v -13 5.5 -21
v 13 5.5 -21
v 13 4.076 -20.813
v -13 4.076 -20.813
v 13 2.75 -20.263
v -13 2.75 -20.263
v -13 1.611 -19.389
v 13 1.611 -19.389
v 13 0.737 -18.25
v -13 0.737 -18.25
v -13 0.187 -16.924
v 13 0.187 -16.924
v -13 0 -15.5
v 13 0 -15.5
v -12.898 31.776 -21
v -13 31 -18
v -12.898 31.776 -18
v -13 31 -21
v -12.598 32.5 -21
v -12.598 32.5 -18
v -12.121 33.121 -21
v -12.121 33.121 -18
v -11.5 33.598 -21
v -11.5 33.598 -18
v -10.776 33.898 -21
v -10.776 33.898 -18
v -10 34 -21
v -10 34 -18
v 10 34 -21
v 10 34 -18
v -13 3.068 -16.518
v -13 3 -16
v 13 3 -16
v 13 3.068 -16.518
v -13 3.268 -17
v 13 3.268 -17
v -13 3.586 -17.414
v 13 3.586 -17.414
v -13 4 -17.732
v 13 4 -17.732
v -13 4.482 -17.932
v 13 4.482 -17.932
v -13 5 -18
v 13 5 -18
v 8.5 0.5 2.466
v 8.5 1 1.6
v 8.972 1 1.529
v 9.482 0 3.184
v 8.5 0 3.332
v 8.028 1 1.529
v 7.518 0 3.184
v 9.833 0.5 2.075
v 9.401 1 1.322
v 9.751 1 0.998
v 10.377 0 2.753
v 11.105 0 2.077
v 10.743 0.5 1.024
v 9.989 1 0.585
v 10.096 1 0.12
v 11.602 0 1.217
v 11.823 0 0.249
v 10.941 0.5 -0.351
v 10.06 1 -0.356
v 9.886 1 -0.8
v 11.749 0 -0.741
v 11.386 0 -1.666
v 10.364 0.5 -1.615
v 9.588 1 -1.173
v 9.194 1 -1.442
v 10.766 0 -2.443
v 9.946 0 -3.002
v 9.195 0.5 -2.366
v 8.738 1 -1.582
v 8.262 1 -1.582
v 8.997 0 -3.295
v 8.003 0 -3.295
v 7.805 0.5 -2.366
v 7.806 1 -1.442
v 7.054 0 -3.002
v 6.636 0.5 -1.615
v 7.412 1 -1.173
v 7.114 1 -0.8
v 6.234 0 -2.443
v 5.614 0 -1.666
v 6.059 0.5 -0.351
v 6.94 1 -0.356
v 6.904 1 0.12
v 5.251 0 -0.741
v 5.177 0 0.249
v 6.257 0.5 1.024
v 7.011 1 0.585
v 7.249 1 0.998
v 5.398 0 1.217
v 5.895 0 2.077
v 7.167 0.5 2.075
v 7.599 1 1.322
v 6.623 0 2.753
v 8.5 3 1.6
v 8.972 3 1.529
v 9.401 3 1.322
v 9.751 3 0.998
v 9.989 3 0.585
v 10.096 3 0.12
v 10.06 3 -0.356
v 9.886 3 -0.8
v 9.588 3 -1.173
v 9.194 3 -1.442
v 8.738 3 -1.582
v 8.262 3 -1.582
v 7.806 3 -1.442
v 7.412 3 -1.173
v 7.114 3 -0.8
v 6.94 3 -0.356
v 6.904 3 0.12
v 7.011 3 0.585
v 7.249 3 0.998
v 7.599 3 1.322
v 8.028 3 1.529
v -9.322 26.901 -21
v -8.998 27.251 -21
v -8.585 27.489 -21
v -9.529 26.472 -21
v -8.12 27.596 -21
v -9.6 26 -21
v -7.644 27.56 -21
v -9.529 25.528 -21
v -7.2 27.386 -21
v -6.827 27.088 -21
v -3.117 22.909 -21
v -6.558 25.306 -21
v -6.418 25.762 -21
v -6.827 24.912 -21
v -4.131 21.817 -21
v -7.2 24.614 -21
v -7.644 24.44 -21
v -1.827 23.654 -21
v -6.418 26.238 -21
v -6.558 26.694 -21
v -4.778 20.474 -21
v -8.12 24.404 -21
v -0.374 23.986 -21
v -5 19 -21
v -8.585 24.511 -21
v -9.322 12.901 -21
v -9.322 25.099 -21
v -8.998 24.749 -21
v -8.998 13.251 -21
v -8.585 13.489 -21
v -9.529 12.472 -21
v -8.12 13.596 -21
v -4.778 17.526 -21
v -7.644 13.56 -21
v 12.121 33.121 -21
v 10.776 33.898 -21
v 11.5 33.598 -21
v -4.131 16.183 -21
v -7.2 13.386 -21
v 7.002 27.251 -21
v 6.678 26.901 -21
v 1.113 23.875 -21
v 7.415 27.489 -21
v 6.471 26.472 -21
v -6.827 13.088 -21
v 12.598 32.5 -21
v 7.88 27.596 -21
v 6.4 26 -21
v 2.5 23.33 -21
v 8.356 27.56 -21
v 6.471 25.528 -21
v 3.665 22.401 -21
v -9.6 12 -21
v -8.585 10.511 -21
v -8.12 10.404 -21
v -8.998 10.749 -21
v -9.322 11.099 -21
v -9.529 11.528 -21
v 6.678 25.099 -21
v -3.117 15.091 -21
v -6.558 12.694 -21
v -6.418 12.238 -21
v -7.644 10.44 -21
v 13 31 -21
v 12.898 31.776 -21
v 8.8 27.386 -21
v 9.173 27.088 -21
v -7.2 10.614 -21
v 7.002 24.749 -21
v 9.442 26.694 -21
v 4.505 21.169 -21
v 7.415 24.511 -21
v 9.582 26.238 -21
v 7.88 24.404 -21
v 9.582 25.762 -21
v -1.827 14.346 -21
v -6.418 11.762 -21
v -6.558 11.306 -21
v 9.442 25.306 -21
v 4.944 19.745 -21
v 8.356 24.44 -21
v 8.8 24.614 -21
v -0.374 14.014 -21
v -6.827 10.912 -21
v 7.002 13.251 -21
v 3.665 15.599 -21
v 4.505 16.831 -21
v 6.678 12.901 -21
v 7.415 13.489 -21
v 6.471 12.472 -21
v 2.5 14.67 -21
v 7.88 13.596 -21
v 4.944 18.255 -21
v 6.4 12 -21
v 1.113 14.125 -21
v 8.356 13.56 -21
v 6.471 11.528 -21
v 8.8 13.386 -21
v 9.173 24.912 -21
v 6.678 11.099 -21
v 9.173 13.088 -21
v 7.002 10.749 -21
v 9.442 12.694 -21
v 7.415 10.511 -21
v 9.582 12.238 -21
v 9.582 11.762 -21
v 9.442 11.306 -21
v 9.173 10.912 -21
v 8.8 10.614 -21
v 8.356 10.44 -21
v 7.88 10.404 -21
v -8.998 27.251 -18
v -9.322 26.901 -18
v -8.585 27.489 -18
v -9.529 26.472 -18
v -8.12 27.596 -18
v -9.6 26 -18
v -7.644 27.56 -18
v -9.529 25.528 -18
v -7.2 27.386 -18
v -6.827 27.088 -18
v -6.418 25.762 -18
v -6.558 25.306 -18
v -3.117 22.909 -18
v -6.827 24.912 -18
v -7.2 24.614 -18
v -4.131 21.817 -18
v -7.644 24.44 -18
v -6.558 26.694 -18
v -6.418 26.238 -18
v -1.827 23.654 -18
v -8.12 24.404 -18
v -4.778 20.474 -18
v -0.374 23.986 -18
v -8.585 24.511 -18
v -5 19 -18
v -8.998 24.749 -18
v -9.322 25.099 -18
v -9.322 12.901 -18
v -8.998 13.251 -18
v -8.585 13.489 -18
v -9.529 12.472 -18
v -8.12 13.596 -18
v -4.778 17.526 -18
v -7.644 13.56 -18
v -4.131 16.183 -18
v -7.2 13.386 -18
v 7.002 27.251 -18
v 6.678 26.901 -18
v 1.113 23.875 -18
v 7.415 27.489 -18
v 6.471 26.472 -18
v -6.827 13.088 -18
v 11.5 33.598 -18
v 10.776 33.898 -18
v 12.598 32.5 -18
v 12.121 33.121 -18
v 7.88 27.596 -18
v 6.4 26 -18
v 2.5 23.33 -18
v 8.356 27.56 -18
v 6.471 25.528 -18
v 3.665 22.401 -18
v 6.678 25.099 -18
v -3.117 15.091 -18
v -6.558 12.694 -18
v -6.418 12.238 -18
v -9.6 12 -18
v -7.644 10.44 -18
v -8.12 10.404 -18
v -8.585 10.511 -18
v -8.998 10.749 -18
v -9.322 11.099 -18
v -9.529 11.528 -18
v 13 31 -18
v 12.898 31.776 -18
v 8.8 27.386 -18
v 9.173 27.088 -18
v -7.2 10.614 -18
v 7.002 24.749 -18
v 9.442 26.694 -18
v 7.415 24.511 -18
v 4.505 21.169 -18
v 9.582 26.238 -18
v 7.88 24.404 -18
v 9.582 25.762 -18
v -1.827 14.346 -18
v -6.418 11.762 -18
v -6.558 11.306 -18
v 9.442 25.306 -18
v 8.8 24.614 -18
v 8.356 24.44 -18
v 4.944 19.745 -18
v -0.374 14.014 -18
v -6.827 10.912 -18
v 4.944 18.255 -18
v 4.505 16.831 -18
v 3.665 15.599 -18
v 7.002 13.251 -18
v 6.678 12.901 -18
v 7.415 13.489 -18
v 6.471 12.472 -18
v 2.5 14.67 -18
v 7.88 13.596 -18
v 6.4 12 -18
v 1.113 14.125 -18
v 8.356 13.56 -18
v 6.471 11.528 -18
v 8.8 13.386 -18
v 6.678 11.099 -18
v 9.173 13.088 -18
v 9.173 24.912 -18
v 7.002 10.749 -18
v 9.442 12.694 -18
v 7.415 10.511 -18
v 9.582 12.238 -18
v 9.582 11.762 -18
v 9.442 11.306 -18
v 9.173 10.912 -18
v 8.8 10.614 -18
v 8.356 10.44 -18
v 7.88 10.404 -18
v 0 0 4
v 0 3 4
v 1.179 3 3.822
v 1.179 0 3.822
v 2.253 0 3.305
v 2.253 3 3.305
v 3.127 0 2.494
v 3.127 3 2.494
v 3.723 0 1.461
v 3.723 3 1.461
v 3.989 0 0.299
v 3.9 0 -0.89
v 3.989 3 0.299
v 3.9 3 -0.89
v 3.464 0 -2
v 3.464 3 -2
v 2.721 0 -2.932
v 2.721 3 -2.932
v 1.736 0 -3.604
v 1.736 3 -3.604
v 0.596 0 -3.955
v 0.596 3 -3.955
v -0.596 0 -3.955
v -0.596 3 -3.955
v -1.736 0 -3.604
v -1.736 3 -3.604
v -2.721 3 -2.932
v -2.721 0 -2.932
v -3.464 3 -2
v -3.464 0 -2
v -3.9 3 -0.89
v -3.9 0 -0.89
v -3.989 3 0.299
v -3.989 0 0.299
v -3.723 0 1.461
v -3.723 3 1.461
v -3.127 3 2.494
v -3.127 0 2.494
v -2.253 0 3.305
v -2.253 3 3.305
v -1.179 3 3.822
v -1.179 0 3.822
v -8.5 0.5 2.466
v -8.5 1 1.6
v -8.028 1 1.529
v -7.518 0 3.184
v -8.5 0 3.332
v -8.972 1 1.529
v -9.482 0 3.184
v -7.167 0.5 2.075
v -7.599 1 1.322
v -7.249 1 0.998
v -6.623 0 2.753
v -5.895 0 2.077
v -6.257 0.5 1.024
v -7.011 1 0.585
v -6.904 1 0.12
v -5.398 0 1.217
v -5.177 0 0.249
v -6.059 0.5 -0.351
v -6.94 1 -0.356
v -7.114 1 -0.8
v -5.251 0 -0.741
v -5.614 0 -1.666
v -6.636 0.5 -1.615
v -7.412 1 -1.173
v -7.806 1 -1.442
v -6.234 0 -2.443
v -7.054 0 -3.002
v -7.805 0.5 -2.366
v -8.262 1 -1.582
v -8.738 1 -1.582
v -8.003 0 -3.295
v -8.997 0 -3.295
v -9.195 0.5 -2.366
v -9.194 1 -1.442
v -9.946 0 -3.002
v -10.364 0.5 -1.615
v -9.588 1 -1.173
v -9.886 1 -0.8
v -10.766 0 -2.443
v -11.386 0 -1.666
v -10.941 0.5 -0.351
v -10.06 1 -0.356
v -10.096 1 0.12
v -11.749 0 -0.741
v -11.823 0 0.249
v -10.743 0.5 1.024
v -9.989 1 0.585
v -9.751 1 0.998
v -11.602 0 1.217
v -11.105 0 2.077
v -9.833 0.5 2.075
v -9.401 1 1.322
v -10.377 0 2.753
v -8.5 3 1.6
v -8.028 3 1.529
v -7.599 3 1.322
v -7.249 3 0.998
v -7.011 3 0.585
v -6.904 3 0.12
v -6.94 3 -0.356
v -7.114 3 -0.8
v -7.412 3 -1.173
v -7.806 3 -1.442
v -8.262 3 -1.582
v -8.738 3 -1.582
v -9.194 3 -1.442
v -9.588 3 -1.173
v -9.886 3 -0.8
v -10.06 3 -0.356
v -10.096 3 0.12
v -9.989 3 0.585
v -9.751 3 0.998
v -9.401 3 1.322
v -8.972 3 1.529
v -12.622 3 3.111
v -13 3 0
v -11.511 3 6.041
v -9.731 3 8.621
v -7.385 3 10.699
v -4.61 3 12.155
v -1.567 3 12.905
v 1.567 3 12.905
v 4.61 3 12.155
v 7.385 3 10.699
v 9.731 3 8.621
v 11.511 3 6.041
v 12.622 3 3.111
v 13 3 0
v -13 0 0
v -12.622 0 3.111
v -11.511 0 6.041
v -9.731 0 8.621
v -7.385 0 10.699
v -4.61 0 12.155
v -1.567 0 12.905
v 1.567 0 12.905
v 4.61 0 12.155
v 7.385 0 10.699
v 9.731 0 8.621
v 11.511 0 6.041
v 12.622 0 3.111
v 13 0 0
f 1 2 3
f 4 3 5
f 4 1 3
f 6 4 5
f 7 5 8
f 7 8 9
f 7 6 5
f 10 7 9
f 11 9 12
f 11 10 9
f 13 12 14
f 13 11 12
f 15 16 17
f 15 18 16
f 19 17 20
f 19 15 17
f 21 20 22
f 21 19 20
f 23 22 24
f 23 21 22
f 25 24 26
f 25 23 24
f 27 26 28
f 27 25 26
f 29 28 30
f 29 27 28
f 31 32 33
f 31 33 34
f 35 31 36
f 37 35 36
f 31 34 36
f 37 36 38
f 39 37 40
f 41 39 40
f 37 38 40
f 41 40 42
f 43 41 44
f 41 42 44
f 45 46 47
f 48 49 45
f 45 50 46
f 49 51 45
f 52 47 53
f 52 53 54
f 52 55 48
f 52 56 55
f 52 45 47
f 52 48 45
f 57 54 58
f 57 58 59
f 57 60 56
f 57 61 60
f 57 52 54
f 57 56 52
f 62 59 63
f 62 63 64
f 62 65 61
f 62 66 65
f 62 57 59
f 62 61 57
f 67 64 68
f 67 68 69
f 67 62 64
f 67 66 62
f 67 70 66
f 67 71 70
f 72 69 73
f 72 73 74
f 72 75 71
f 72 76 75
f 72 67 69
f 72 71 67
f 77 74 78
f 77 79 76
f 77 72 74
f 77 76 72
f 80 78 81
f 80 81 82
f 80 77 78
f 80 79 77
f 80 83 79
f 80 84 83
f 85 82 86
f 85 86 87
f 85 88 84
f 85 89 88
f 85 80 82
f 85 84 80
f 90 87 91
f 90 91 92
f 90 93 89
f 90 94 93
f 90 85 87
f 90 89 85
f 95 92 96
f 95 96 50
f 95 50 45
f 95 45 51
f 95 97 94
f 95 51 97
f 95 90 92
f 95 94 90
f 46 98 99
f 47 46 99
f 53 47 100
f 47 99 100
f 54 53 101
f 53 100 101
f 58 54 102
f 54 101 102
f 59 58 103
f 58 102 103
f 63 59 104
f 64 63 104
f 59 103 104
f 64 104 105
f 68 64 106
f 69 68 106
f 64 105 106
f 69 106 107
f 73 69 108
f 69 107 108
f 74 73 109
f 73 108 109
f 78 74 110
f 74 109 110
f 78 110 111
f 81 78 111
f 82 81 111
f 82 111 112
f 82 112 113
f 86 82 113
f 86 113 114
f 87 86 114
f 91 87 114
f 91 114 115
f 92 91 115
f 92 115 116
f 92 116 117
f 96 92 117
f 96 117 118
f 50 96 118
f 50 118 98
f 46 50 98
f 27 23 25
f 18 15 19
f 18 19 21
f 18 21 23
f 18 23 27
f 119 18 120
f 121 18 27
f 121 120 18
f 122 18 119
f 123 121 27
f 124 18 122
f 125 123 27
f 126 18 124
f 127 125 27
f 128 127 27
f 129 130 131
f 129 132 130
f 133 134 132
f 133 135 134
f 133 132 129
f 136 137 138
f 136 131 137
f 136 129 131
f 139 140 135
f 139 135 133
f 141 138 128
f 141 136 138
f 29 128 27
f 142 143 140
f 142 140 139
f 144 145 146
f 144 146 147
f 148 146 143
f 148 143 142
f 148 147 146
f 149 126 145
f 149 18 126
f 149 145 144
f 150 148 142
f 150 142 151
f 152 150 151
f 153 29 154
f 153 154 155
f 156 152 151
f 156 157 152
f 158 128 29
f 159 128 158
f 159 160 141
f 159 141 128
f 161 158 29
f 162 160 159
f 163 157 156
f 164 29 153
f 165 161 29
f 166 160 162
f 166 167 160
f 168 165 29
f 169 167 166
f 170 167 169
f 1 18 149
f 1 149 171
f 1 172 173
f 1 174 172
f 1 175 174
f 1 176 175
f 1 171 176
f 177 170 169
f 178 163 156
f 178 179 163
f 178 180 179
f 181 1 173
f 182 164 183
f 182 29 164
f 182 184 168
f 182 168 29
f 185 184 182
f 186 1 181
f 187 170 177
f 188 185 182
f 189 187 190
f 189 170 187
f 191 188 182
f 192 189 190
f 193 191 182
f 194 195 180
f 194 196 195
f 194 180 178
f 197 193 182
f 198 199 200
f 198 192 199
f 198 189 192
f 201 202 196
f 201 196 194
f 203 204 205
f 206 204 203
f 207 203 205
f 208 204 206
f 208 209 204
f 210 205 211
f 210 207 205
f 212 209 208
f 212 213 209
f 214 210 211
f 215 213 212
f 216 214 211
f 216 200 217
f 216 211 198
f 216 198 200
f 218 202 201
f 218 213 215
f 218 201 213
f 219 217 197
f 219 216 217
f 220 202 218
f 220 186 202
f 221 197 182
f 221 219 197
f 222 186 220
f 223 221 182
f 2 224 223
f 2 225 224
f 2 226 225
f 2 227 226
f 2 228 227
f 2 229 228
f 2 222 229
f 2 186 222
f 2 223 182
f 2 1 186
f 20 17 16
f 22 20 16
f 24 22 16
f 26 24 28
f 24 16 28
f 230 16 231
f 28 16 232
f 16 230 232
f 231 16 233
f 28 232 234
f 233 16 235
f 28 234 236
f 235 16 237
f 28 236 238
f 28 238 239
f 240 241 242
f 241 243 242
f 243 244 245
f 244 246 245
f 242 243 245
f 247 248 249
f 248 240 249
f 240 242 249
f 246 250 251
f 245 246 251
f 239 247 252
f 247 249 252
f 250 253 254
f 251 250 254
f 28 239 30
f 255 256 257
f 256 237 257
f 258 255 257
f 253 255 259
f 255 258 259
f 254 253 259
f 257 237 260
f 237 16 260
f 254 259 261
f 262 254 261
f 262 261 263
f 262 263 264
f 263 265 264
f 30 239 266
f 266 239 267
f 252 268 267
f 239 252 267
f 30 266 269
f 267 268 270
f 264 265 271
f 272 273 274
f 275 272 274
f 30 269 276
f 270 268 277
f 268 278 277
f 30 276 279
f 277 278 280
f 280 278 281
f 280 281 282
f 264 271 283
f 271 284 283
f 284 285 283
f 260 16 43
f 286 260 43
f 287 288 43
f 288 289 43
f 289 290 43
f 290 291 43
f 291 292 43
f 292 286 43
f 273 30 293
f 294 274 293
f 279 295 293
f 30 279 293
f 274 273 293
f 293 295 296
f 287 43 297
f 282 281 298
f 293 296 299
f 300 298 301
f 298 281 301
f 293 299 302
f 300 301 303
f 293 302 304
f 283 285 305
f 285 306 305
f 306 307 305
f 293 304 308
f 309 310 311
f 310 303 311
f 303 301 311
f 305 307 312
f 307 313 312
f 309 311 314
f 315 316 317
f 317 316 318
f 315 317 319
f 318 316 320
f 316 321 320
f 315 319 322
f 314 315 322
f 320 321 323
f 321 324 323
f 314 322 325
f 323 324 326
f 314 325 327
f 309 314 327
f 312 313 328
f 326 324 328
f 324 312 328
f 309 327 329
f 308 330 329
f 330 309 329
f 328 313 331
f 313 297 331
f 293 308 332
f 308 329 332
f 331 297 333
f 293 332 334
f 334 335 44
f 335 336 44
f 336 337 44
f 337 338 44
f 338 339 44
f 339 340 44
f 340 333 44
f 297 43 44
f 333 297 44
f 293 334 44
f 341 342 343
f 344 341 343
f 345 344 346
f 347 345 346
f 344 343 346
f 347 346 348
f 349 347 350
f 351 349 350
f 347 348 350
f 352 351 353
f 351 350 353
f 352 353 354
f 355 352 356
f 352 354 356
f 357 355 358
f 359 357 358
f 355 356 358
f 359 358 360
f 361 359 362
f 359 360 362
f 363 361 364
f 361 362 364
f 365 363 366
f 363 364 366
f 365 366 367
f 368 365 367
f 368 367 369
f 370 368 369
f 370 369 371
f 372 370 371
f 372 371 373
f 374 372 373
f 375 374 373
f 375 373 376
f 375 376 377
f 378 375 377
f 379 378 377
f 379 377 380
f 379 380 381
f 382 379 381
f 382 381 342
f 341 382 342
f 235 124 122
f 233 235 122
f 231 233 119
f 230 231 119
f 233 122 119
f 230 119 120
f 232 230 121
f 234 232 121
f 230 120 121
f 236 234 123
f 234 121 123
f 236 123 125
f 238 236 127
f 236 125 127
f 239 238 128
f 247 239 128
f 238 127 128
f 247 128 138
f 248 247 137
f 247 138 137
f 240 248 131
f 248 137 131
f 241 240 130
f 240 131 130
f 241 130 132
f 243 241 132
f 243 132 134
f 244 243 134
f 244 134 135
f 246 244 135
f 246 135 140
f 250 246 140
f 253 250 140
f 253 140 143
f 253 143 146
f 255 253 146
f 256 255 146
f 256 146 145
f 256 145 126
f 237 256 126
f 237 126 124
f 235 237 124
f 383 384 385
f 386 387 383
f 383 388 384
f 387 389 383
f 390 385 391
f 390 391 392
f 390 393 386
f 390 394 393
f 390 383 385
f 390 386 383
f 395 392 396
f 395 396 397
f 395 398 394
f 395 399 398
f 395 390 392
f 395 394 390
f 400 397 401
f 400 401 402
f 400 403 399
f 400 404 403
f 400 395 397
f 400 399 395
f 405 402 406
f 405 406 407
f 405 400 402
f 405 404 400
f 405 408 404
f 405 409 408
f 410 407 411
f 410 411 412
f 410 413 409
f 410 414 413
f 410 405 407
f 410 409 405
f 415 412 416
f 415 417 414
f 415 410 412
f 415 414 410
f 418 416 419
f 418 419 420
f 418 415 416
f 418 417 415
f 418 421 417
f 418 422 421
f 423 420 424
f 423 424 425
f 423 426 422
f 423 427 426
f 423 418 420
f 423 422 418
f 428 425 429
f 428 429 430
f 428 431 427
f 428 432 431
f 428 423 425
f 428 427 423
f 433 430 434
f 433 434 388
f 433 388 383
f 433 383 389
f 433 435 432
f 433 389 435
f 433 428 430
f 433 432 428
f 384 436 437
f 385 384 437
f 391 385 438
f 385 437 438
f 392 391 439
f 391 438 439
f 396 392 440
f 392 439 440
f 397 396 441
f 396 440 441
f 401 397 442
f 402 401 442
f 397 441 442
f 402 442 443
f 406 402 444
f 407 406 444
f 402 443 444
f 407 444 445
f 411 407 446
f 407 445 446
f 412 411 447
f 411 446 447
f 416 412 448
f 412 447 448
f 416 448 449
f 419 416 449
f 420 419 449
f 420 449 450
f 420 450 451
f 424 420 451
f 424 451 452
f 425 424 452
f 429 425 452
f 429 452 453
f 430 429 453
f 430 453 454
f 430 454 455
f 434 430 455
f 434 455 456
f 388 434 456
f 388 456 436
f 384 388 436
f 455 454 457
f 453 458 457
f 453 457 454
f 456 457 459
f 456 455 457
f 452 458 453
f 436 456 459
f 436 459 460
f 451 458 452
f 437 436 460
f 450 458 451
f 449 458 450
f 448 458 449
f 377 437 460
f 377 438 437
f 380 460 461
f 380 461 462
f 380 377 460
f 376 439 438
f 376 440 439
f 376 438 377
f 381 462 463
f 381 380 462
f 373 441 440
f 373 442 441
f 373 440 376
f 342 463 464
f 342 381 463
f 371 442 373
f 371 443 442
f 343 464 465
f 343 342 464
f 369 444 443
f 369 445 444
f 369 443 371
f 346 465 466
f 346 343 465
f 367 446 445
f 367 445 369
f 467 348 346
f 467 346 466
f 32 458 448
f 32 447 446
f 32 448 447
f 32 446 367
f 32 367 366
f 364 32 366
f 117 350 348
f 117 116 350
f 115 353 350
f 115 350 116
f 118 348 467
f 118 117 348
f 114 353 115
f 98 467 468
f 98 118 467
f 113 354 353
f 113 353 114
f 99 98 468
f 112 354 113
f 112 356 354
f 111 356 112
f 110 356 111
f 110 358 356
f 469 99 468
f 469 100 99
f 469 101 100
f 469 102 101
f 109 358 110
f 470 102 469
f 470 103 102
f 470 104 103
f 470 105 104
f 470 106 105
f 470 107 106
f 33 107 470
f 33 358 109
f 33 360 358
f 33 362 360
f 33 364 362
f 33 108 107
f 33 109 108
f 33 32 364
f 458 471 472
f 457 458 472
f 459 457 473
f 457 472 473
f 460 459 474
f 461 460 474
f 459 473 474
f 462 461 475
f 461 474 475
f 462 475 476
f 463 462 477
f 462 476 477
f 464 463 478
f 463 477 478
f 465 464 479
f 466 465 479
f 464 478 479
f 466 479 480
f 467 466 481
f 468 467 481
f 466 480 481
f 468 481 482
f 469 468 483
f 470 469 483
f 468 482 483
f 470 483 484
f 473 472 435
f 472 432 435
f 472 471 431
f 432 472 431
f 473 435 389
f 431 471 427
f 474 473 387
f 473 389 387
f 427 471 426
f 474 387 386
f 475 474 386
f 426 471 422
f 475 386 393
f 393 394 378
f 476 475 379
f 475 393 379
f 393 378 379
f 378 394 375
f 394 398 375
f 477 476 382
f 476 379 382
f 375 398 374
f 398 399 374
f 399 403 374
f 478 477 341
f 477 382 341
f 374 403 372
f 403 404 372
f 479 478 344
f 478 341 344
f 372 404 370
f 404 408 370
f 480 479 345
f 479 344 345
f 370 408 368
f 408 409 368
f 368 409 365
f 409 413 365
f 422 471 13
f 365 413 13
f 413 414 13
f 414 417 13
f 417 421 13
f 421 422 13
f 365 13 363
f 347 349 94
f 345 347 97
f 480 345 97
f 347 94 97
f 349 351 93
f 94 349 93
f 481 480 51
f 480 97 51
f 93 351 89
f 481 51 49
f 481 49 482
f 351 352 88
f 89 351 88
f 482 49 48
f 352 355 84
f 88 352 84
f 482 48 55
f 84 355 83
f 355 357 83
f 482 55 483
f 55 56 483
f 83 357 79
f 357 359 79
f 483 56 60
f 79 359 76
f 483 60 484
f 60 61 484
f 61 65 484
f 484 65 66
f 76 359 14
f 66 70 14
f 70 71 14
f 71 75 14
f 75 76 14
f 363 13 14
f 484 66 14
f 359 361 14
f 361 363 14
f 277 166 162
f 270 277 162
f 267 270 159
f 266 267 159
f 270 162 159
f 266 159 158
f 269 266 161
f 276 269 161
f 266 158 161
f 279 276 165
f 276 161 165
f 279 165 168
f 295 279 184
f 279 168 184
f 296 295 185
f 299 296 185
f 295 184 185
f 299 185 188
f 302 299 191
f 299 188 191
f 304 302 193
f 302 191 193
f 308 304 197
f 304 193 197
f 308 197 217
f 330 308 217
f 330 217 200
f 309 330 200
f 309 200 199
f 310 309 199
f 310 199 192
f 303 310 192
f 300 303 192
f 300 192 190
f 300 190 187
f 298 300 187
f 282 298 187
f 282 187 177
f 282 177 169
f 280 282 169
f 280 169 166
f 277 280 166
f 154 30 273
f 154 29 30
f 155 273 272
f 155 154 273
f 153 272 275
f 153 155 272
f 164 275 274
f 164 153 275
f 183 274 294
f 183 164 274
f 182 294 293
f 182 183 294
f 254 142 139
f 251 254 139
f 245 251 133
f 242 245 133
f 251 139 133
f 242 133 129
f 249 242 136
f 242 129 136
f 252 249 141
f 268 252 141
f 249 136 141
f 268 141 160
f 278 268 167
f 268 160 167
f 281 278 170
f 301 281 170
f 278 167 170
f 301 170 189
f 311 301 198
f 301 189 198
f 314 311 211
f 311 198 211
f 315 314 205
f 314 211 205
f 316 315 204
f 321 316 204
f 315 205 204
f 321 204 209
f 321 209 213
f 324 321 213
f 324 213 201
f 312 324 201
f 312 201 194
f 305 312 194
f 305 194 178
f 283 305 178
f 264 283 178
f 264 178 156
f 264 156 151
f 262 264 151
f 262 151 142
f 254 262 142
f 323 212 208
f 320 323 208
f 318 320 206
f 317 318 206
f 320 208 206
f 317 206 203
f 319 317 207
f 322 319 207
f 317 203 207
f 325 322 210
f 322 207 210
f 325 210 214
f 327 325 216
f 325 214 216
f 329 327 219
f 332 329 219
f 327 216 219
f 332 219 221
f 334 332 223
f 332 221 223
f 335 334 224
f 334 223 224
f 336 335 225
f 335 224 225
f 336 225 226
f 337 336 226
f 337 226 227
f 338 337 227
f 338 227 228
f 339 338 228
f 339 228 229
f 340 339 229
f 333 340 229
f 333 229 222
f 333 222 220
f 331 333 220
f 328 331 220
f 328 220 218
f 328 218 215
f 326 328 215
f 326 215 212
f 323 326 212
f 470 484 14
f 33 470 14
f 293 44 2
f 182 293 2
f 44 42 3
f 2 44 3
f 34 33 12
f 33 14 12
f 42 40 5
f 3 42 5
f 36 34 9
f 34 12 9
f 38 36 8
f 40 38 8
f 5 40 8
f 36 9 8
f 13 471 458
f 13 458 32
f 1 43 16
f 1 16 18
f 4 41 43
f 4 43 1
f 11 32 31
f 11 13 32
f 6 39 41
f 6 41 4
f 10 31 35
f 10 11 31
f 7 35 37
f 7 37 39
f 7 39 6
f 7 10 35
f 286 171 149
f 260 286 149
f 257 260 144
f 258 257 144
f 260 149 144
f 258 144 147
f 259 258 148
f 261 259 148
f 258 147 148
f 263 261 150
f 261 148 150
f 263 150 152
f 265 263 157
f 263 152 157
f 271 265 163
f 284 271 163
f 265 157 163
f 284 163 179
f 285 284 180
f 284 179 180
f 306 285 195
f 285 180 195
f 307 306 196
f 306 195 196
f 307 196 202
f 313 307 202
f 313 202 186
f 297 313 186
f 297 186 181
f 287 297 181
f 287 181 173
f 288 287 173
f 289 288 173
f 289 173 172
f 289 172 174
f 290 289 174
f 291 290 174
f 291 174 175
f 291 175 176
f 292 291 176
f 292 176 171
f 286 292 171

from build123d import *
from OCP.BRepFilletAPI import BRepFilletAPI_MakeChamfer

# Parameters (mm, degrees)
EXTRUDE_1_DEPTH     = 3
SKETCH_2_R          = 4
SKETCH_2_R_2        = 1.6
CUT_EXTRUDE_1_DEPTH = 5
SKETCH_3_W          = 26
SKETCH_3_H          = 3
EXTRUDE_2_DEPTH     = 31
FILLET_1_R          = 2
FILLET_2_R          = 5.5
SKETCH_4_R          = 5
SKETCH_4_R_2        = 1.6
CUT_EXTRUDE_2_DEPTH = 31
FILLET_3_R          = 3
CHAMFER_1_SIZE      = 1
CHAMFER_1_SIZE2     = 1.732050808


with BuildPart() as part:
    # ｽｹｯﾁ1 → ﾎﾞｽ - 押し出し1 (new body)
    with BuildSketch(Plane(origin=(0, 0, 0), x_dir=(1, 0, 0), z_dir=(0, 1, 0))):
        with BuildLine():
            Line((-13, 21), (-13, 0))
            ThreePointArc((-13, 0), (0, -13), (13, 0))
            Line((13, 0), (13, 21))
            Line((13, 21), (-13, 21))
        make_face()
    extrude(amount=EXTRUDE_1_DEPTH)

    # ｽｹｯﾁ2 → ｶｯﾄ - 押し出し1 (cut)
    with BuildSketch(Plane(origin=(0, 3, 0), x_dir=(1, 0, 0), z_dir=(0, 1, 0))):
        Circle(SKETCH_2_R)
        with Locations((-8.5, 0)):
            Circle(SKETCH_2_R_2)
        with Locations((8.5, 0)):
            Circle(SKETCH_2_R_2)
    extrude(amount=-CUT_EXTRUDE_1_DEPTH, mode=Mode.SUBTRACT)

    # ｽｹｯﾁ3 → ﾎﾞｽ - 押し出し2 (add)
    with BuildSketch(Plane(origin=(0, 3, 0), x_dir=(1, 0, 0), z_dir=(0, 1, 0))):
        with Locations((0, 19.5)):
            Rectangle(SKETCH_3_W, SKETCH_3_H)
    extrude(amount=EXTRUDE_2_DEPTH)

    # ﾌｨﾚｯﾄ1
    fillet_1_edges = [part.edges().sort_by_distance(p)[0] for p in [
        (0, 3, -18),
    ]]
    fillet(fillet_1_edges, radius=FILLET_1_R)

    # ﾌｨﾚｯﾄ2
    fillet_2_edges = [part.edges().sort_by_distance(p)[0] for p in [
        (0, 0, -21),
    ]]
    fillet(fillet_2_edges, radius=FILLET_2_R)

    # ｽｹｯﾁ4 → ｶｯﾄ - 押し出し2 (cut)
    with BuildSketch(Plane(origin=(0, 0, -21), x_dir=(-1, 0, 0), z_dir=(0, 0, -1))):
        with Locations((0, 19)):
            Circle(SKETCH_4_R)
        with Locations((-8, 26)):
            Circle(SKETCH_4_R_2)
        with Locations((8, 26)):
            Circle(SKETCH_4_R_2)
        with Locations((-8, 12)):
            Circle(SKETCH_4_R_2)
        with Locations((8, 12)):
            Circle(SKETCH_4_R_2)
    extrude(amount=-CUT_EXTRUDE_2_DEPTH, mode=Mode.SUBTRACT)

    # ﾌｨﾚｯﾄ3
    fillet_3_edges = [part.edges().sort_by_distance(p)[0] for p in [
        (-13, 34, -19.5),
        (13, 34, -19.5),
    ]]
    fillet(fillet_3_edges, radius=FILLET_3_R)

    # 面取り1: one chamfer whose edges measure the first distance from different faces: ONE call of the kernel's chamfer builder (chamfer() names one face for all edges)
    chamfer_1_edges_1 = [part.edges().sort_by_distance(p)[0] for p in [
        (-10.1, 0, 0),
    ]]
    chamfer_1_side_1 = [part.faces().sort_by_distance(p)[0] for p in [
        (-10.1, 1.5, 0),
    ]]
    chamfer_1_edges_2 = [part.edges().sort_by_distance(p)[0] for p in [
        (6.9, 0, 0),
    ]]
    chamfer_1_side_2 = [part.faces().sort_by_distance(p)[0] for p in [
        (6.9, 1.5, 0),
    ]]
    chamfer_1 = BRepFilletAPI_MakeChamfer(part.part.solid().wrapped)
    for e in chamfer_1_edges_1:
        chamfer_1.Add(CHAMFER_1_SIZE, CHAMFER_1_SIZE2, e.wrapped, chamfer_1_side_1[0].wrapped)  # the first distance lies on this face
    for e in chamfer_1_edges_2:
        chamfer_1.Add(CHAMFER_1_SIZE, CHAMFER_1_SIZE2, e.wrapped, chamfer_1_side_2[0].wrapped)  # the first distance lies on this face
    add(Compound.cast(chamfer_1.Shape()), mode=Mode.REPLACE)


solid = part.part
